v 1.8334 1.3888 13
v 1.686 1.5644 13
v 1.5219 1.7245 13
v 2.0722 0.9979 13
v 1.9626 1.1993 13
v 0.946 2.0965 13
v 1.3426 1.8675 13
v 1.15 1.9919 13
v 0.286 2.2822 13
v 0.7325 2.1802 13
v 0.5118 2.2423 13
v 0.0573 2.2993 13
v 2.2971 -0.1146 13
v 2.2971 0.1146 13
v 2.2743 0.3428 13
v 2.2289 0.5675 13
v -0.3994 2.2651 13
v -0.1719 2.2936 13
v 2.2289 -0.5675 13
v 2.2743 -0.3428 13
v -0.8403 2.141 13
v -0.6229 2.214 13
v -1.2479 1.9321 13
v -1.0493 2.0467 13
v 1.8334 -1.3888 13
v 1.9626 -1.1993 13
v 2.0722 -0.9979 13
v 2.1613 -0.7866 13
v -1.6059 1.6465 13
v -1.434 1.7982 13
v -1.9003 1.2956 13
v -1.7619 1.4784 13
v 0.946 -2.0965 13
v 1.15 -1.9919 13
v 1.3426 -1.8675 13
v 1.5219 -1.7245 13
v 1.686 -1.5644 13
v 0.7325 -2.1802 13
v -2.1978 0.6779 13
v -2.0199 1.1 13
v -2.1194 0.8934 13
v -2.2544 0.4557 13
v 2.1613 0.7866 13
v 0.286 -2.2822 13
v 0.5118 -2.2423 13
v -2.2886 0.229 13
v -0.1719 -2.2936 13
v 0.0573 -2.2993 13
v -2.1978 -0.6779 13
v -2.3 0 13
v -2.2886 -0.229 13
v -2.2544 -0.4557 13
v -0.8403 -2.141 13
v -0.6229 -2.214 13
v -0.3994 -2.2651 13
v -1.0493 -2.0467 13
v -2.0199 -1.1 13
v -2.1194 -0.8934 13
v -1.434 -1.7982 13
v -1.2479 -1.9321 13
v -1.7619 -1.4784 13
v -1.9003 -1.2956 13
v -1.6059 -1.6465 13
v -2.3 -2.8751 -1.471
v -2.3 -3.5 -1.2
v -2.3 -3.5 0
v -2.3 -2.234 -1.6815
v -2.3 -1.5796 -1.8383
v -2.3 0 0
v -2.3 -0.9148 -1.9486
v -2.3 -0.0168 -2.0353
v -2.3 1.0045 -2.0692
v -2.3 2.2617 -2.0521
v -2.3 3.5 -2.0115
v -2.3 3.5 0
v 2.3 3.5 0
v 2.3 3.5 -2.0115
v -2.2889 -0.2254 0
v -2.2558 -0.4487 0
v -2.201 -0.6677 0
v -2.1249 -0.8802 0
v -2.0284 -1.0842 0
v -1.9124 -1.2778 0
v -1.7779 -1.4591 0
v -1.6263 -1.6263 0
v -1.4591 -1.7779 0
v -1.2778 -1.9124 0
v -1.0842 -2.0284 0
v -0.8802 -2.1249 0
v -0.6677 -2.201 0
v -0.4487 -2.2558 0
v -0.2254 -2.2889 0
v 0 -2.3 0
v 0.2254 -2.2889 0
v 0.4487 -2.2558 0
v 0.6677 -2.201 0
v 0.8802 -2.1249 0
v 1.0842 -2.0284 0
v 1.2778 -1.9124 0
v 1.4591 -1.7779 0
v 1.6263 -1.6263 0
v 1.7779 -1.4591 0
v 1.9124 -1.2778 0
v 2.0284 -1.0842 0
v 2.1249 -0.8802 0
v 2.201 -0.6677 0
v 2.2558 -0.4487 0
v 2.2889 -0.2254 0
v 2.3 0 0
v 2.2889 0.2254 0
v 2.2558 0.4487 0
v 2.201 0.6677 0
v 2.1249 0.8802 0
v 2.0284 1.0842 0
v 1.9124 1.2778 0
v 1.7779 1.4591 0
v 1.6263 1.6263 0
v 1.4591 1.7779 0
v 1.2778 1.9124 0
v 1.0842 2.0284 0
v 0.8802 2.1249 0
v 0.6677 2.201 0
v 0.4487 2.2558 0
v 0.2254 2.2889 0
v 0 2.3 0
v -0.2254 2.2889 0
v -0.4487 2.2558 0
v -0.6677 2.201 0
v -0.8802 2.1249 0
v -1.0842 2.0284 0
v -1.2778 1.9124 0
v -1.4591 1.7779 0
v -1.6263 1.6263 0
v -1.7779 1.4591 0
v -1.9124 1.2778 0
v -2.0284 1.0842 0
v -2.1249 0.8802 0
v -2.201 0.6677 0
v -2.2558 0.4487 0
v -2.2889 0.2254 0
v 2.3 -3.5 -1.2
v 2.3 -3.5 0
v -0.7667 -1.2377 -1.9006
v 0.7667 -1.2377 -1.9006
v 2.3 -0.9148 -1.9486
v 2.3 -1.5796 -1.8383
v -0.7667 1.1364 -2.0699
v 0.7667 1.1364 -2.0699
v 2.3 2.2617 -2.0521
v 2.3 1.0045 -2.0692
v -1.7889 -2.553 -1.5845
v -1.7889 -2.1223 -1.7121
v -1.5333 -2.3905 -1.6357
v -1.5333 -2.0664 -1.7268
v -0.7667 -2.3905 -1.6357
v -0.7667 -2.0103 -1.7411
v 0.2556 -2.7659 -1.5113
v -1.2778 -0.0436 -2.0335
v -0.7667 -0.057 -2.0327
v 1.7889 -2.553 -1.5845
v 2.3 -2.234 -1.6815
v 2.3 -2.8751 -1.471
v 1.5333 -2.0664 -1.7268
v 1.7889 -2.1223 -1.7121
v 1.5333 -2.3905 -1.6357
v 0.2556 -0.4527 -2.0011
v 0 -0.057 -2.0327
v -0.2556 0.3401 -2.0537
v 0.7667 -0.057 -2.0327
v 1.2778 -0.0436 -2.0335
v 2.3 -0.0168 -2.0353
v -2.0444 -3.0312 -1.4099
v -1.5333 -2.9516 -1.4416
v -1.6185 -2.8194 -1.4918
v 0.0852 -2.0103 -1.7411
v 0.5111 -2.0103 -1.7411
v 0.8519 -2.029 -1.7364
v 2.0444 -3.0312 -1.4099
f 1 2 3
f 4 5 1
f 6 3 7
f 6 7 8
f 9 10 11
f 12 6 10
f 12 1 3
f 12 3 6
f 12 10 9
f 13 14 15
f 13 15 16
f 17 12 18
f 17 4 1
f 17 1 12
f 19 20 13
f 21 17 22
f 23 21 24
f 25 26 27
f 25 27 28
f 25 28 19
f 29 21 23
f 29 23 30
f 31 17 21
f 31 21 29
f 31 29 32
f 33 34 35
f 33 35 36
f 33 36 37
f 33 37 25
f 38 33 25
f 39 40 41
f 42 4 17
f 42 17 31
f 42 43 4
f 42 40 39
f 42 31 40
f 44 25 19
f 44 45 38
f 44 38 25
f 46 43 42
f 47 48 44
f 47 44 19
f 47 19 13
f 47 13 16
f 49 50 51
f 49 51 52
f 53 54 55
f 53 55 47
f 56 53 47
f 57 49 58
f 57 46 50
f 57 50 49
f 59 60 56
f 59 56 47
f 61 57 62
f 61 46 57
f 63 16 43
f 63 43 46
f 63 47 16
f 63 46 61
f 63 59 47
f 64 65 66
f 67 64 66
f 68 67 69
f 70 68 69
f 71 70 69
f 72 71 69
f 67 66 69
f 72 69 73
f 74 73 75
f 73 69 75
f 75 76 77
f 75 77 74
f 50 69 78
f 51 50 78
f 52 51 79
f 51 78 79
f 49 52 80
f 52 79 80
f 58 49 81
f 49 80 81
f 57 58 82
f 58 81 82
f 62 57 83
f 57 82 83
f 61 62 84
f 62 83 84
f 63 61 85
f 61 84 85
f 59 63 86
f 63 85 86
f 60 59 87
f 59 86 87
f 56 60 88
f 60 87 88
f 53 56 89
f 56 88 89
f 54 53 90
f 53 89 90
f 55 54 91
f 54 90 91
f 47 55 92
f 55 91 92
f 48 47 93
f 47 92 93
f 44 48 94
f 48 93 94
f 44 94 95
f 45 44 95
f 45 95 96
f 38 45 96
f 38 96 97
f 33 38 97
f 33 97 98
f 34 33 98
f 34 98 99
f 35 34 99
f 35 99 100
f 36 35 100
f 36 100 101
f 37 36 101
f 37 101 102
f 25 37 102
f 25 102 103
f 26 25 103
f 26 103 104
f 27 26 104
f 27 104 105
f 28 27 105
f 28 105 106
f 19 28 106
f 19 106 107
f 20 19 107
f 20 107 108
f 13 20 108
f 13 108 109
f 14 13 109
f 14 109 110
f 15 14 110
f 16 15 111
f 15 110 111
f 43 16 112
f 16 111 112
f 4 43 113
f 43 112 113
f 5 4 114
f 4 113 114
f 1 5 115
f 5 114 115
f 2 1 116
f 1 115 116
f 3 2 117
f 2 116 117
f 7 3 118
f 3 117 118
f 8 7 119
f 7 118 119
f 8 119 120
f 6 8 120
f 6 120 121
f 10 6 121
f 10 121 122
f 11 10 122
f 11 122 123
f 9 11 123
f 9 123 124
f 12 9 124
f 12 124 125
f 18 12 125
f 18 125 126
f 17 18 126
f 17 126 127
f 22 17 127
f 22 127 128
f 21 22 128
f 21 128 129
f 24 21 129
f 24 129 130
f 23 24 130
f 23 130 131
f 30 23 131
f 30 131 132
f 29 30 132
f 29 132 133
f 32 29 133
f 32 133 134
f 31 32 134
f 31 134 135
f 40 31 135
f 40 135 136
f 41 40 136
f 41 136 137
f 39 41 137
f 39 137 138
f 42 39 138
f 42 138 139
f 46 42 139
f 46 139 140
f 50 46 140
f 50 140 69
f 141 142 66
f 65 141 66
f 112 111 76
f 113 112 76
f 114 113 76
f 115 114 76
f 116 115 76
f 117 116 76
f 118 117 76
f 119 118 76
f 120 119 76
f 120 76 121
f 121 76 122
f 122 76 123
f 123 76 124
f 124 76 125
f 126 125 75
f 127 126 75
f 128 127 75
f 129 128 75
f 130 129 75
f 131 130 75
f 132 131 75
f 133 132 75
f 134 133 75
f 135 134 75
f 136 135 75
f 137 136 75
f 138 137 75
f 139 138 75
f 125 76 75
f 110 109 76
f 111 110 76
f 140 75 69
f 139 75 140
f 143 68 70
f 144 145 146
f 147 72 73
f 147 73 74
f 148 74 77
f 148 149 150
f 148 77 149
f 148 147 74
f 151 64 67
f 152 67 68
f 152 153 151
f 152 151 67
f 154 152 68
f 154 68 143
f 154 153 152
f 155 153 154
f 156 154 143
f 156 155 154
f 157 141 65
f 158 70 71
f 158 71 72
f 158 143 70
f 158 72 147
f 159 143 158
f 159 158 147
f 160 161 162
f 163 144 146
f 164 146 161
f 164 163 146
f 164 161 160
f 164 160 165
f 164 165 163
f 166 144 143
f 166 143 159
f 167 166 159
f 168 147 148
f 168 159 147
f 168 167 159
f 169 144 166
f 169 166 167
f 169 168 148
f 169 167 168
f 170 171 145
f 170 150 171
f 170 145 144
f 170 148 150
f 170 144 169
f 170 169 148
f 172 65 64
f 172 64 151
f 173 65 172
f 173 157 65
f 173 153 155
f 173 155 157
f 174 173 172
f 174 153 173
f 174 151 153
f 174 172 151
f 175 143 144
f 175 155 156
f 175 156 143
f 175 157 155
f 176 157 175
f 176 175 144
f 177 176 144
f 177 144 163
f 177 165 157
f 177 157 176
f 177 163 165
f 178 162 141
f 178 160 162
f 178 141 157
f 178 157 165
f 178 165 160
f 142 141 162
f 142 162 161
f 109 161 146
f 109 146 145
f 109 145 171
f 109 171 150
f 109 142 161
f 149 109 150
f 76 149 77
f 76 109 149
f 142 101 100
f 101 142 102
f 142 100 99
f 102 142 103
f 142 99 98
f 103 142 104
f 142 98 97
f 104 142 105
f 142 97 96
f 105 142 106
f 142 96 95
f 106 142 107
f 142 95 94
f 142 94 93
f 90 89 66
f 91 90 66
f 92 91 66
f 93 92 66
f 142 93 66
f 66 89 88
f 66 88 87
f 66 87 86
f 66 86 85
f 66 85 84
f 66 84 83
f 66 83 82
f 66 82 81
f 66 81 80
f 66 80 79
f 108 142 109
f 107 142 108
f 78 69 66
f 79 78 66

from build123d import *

# Parameters (mm, degrees)
SKETCH1_R           = 2.3
BOSS_EXTRUDE1_DEPTH = 13
SKETCH2_W           = 4.6
SKETCH2_H           = 7
BOSS_EXTRUDE2_DEPTH = 3
CUT_EXTRUDE1_DEPTH  = 4.6


with BuildPart() as part:
    # Sketch1 → Boss-Extrude1 (new body)
    with BuildSketch(Plane.XY):
        with Locations(Location((0, 0, 0), (0, 0, 180))):
            Circle(SKETCH1_R)
    extrude(amount=BOSS_EXTRUDE1_DEPTH)

    # Sketch2 → Boss-Extrude2 (add)
    with BuildSketch(Plane(origin=(0, 0, 0), x_dir=(-1, 0, 0), z_dir=(0, 0, -1))):
        Rectangle(SKETCH2_W, SKETCH2_H)
    extrude(amount=BOSS_EXTRUDE2_DEPTH)

    # Sketch3 → Cut-Extrude1 (cut)
    with BuildSketch(Plane(origin=(2.3, 0, 0), x_dir=(0, 0, -1), z_dir=(1, 0, 0))):
        with BuildLine():
            Line((1.2, -3.5), (3, -3.5))
            Line((3, -3.5), (3, 3.5))
            Line((3, 3.5), (2.011534301, 3.5))
            add(Edge.make_bspline(
                [(1.2, -3.5), (2.267514736, -1.334400874), (2.08240034, 1.182388913), (2.011534301, 3.5)],
                knots=[0, 0, 0, 0, 1, 1, 1, 1], degree=3))
        make_face()
    extrude(amount=-CUT_EXTRUDE1_DEPTH, mode=Mode.SUBTRACT)


solid = part.part
